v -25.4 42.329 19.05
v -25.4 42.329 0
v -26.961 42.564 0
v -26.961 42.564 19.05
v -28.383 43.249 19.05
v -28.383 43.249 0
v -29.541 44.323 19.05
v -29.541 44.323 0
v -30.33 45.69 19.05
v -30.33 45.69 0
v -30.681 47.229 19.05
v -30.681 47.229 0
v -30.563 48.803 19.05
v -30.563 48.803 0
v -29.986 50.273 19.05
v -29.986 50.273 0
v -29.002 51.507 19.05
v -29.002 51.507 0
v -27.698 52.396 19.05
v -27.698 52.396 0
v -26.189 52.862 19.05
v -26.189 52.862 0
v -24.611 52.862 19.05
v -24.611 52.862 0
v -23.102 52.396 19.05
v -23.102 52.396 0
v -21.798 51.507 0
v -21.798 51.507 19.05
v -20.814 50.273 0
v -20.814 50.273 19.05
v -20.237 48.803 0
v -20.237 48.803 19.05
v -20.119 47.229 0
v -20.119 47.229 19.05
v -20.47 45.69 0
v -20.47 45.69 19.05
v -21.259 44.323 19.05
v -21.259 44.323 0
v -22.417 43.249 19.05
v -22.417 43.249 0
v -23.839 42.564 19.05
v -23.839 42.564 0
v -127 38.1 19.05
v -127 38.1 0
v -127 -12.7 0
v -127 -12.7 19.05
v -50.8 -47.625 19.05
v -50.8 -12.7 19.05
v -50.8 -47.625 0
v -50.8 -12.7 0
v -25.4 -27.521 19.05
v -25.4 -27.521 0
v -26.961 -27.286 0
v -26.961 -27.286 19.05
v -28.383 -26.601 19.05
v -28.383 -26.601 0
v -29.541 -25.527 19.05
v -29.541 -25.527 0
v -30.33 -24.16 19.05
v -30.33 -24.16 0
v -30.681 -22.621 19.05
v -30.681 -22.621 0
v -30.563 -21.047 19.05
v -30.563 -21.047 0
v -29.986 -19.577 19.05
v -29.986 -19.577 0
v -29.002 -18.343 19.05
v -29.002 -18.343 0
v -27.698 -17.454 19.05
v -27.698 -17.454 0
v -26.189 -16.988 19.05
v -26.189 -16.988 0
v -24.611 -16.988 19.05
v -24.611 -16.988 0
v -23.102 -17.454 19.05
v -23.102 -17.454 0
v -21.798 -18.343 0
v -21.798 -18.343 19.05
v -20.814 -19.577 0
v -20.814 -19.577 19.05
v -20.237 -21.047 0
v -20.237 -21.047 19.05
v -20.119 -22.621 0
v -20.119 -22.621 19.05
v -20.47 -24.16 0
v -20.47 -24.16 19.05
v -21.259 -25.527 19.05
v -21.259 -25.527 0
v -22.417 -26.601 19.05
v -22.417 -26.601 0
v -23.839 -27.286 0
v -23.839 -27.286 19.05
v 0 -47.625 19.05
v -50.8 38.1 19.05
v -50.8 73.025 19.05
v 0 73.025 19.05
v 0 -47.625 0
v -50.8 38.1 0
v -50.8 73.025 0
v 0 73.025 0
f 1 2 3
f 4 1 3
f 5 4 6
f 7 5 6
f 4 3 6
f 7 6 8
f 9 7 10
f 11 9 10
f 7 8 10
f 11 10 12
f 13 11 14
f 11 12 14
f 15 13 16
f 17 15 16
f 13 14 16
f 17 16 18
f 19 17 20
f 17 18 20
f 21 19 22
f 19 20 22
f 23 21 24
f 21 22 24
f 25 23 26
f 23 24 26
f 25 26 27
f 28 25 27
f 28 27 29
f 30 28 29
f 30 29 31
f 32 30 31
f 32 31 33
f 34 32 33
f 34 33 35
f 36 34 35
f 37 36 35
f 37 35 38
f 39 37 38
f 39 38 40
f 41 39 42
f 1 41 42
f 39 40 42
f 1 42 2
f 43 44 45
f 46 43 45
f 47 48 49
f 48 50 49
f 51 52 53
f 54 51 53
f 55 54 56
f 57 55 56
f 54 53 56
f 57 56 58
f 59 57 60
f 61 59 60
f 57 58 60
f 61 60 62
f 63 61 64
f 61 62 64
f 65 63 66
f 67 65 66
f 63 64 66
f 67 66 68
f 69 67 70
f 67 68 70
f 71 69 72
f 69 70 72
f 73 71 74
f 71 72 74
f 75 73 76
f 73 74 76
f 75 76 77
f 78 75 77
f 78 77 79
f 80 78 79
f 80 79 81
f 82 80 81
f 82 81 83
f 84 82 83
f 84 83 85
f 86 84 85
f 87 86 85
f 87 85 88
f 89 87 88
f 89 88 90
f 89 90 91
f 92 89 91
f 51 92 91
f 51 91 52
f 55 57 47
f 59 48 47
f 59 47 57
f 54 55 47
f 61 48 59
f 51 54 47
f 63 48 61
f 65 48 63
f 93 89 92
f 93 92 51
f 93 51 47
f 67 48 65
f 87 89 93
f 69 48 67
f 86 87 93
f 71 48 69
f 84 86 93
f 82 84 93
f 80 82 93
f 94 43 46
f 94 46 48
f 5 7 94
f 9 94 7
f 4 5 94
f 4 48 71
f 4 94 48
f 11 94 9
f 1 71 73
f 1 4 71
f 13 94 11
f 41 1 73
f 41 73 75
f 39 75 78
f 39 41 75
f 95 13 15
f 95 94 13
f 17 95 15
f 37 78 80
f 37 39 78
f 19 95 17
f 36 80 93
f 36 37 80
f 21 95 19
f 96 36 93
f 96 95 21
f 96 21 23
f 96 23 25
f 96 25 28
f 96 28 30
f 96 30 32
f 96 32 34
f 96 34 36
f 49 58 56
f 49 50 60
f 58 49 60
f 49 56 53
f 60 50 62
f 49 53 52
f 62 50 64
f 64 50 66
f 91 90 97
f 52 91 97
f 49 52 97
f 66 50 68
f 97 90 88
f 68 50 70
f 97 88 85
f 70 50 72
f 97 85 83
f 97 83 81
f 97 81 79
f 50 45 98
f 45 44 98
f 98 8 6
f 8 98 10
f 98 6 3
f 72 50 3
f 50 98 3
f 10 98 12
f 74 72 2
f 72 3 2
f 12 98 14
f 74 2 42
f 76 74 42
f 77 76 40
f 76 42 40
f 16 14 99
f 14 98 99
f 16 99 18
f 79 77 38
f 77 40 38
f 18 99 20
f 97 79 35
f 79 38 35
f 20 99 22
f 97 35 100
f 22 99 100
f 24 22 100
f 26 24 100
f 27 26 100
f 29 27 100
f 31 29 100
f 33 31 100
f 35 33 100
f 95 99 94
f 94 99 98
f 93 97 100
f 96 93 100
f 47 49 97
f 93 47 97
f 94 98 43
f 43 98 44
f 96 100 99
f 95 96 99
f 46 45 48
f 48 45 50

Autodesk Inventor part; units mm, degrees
ref_plane "YZ Plane" through (0, 0, 0) normal (1, 0, 0) x (0, 1, 0)
ref_plane "XZ Plane" through (0, 0, 0) normal (0, 1, 0) x (-1, 0, 0)
ref_plane "XY Plane" through (0, 0, 0) normal (0, 0, 1) x (1, 0, 0)
sketch "Sketch1" plane through (0, 0, 0) normal (0, 0, 1) x (1, 0, 0)
  line L0 (0, 0) -> (-127, 0) projected
  line L1 (0, 0) -> (0, 25.4) projected
  line L2 (0, 25.4) -> (-127, 25.4) projected
  line L3 (-127, 0) -> (-127, 25.4) projected
  line L4 (0, 73.025) -> (-50.8, 73.025)
  line L5 (-50.8, 73.025) -> (-50.8, -47.625)
  line L6 (-50.8, -47.625) -> (0, -47.625)
  line L7 (0, -47.625) -> (0, 73.025)
  line L8 (-50.8, 38.1) -> (-127, 38.1)
  line L9 (-127, 38.1) -> (-127, -12.7)
  line L10 (-127, -12.7) -> (-50.8, -12.7)
  line L11 (-50.8, -12.7) -> (-50.8, 38.1)
  line L12 (-150.4488, 12.7) -> (41.0315, 12.7)
  dimension "d0" = 50.8
  dimension "d1" = 0
  dimension "d2" = 50.8
  dimension "d4" = 120.65
  dimension "d5" = 60.325
  dimension "d6" = 25.4
extrude "Extrusion1" add sketch "Sketch1" along normal blind 19.05
hole "Hole1" at (-25.4, 47.625, 19.05) direction (0, 0, -1) diameter 10.5918 end through all thread size "1/2-13 UNC" class "1B" standard "ANSI Unified Screw Threads"
hole "Hole2" at (-25.4, -22.225, 19.05) direction (0, 0, -1) diameter 10.5918 end through all thread size "1/2-13 UNC" class "1B" standard "ANSI Unified Screw Threads"
equation "\"d2\" = d0"
equation "\"d5\" = 0.5 * d4"
equation "\"d6\" = 0.5 * d2"
properties part number "Tbracket"
